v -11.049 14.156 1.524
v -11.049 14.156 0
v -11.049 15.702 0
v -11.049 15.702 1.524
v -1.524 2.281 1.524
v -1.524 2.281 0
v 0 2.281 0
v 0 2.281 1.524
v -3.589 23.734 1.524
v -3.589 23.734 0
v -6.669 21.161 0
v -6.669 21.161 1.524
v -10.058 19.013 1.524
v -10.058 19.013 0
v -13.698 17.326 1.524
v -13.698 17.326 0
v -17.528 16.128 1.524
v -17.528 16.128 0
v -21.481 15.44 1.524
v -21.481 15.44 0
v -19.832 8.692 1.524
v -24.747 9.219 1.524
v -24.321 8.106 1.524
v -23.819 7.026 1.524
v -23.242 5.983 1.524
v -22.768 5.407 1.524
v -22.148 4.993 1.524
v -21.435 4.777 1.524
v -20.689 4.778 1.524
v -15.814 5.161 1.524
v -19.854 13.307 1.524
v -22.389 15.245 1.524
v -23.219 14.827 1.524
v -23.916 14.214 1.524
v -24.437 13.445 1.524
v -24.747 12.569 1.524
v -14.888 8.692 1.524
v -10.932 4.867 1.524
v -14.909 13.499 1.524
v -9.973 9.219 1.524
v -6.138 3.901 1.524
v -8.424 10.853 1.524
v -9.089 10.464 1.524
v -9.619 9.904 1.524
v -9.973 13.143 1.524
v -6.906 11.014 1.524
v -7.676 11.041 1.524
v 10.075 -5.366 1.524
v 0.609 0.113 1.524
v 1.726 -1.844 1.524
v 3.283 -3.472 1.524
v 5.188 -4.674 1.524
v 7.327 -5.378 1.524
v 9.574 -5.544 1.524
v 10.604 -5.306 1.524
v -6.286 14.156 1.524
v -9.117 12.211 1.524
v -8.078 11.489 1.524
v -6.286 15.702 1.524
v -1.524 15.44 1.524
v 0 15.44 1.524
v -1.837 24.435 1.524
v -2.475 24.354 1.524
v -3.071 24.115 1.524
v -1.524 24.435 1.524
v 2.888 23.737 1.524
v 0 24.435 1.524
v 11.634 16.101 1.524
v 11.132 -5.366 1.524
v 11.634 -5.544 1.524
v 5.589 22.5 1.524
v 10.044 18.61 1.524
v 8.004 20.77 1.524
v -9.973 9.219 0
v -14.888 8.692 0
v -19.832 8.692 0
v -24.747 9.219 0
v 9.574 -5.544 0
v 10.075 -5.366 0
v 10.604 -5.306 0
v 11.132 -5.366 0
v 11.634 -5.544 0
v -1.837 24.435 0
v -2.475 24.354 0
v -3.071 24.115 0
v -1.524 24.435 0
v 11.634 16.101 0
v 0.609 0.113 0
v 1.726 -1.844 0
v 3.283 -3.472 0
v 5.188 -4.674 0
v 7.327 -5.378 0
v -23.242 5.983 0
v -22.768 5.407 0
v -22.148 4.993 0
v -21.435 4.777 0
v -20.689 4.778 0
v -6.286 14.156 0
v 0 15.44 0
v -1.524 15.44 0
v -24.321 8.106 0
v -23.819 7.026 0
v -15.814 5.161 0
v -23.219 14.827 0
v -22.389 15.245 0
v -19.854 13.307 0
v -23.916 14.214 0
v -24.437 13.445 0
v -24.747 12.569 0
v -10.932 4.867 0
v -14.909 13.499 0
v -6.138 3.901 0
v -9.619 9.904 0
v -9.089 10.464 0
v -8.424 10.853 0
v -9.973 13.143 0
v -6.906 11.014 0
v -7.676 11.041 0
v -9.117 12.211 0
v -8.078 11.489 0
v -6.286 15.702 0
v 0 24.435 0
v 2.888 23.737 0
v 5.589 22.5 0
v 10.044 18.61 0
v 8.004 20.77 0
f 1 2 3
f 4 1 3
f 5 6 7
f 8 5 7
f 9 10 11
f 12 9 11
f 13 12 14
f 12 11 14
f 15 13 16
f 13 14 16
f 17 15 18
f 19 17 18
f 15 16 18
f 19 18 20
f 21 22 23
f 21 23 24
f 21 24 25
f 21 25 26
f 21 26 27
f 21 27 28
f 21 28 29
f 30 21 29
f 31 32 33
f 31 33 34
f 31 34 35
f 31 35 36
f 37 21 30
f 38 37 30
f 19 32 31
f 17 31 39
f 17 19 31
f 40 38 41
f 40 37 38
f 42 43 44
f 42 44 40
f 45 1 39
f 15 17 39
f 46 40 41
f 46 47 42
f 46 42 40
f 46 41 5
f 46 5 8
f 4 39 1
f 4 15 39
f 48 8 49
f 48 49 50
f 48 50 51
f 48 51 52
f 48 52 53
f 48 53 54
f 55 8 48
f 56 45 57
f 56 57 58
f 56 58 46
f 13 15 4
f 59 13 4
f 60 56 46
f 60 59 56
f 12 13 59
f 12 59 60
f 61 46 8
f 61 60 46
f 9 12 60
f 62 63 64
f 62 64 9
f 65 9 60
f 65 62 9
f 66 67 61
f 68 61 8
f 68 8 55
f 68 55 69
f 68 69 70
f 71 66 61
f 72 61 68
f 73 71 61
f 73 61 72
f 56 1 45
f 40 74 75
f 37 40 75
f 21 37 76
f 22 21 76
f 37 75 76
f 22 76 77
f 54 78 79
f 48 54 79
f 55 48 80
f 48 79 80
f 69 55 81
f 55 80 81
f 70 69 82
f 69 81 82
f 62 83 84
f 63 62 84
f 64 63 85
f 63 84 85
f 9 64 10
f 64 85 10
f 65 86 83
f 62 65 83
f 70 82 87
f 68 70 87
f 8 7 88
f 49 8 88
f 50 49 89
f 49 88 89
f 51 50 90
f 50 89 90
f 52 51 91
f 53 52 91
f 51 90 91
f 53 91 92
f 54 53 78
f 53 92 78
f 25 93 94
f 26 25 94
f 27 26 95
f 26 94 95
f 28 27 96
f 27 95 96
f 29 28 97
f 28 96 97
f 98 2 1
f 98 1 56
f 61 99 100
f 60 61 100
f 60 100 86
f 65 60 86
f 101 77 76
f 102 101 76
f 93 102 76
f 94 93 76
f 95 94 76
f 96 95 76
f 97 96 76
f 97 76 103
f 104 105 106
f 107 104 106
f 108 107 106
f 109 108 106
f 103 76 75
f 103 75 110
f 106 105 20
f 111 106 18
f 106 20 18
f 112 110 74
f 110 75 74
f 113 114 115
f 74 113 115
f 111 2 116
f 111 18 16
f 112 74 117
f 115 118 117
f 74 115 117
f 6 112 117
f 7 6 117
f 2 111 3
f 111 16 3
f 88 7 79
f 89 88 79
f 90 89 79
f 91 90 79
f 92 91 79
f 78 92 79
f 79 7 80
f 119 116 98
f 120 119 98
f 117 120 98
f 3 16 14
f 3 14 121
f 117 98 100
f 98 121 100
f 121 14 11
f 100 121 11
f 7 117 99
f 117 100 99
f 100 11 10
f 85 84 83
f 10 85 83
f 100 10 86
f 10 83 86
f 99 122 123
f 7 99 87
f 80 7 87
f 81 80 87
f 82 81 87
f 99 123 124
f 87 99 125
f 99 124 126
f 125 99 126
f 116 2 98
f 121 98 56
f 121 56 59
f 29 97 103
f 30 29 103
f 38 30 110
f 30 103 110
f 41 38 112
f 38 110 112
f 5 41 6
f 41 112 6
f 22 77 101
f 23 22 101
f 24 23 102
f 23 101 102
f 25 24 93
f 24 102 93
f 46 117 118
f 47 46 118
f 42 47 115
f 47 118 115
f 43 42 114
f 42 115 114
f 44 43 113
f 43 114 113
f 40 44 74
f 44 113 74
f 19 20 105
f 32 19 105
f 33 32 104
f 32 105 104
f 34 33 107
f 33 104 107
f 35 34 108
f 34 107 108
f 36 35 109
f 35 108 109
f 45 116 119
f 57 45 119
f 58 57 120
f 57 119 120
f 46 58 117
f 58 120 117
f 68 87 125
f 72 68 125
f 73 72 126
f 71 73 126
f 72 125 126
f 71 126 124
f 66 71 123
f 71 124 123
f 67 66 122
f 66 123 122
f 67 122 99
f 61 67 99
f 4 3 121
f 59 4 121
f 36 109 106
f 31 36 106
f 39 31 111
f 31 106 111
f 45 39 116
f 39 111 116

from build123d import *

# Parameters (mm, degrees)
SKETCH1_W           = 4.7625
SKETCH1_H           = 1.545684244
BOSS_EXTRUDE1_DEPTH = 1.524


with BuildPart() as part:
    # Sketch1 → Boss-Extrude1 (new body)
    with BuildSketch(Plane.XY):
        with BuildLine():
            Line((0, 15.440411119), (-1.524, 15.440411119))
            Line((-1.524, 15.440411119), (-1.524, 24.435175852))
            Line((-1.524, 24.435175852), (-1.836778674, 24.435175852))
            ThreePointArc((-1.836778674, 24.435175852), (-2.780560258, 24.253326891), (-3.589203495, 23.733818626))
            ThreePointArc((-3.589203495, 23.733818626), (-11.850131673, 18.109761084), (-21.480683494, 15.440411119))
            ThreePointArc((-21.480683494, 15.440411119), (-23.587055129, 14.543073006), (-24.747192379, 12.569219234))
            ThreePointArc((-24.747192379, 12.569219234), (-17.383897912, 13.471716361), (-9.972791779, 13.142911901))
            ThreePointArc((-9.972791779, 13.142911901), (-8.617730977, 11.821371906), (-6.905922332, 11.013678341))
            ThreePointArc((-6.905922332, 11.013678341), (-8.770219675, 10.681853269), (-9.972791779, 9.219139081))
            ThreePointArc((-9.972791779, 9.219139081), (-17.359992079, 8.625773055), (-24.747192379, 9.219139081))
            ThreePointArc((-24.747192379, 9.219139081), (-24.079326319, 7.561664754), (-23.241579524, 5.983233086))
            ThreePointArc((-23.241579524, 5.983233086), (-22.148302871, 4.993292395), (-20.68927527, 4.777712082))
            ThreePointArc((-20.68927527, 4.777712082), (-10.932367406, 4.867164845), (-1.524, 2.281072115))
            Line((-1.524, 2.281072115), (0, 2.281072115))
            ThreePointArc((0, 2.281072115), (3.282961886, -3.471531025), (9.573778774, -5.544187416))
            ThreePointArc((9.573778774, -5.544187416), (10.603851301, -5.306050671), (11.633923828, -5.544187416))
            Line((11.633923828, -5.544187416), (11.633923828, 16.100831607))
            ThreePointArc((11.633923828, 16.100831607), (6.837865982, 21.693085274), (0, 24.435175852))
            Line((0, 24.435175852), (0, 15.440411119))
        make_face()
        with Locations((-8.66775, 14.92904471)):
            Rectangle(SKETCH1_W, SKETCH1_H, mode=Mode.SUBTRACT)
    extrude(amount=BOSS_EXTRUDE1_DEPTH)


solid = part.part
